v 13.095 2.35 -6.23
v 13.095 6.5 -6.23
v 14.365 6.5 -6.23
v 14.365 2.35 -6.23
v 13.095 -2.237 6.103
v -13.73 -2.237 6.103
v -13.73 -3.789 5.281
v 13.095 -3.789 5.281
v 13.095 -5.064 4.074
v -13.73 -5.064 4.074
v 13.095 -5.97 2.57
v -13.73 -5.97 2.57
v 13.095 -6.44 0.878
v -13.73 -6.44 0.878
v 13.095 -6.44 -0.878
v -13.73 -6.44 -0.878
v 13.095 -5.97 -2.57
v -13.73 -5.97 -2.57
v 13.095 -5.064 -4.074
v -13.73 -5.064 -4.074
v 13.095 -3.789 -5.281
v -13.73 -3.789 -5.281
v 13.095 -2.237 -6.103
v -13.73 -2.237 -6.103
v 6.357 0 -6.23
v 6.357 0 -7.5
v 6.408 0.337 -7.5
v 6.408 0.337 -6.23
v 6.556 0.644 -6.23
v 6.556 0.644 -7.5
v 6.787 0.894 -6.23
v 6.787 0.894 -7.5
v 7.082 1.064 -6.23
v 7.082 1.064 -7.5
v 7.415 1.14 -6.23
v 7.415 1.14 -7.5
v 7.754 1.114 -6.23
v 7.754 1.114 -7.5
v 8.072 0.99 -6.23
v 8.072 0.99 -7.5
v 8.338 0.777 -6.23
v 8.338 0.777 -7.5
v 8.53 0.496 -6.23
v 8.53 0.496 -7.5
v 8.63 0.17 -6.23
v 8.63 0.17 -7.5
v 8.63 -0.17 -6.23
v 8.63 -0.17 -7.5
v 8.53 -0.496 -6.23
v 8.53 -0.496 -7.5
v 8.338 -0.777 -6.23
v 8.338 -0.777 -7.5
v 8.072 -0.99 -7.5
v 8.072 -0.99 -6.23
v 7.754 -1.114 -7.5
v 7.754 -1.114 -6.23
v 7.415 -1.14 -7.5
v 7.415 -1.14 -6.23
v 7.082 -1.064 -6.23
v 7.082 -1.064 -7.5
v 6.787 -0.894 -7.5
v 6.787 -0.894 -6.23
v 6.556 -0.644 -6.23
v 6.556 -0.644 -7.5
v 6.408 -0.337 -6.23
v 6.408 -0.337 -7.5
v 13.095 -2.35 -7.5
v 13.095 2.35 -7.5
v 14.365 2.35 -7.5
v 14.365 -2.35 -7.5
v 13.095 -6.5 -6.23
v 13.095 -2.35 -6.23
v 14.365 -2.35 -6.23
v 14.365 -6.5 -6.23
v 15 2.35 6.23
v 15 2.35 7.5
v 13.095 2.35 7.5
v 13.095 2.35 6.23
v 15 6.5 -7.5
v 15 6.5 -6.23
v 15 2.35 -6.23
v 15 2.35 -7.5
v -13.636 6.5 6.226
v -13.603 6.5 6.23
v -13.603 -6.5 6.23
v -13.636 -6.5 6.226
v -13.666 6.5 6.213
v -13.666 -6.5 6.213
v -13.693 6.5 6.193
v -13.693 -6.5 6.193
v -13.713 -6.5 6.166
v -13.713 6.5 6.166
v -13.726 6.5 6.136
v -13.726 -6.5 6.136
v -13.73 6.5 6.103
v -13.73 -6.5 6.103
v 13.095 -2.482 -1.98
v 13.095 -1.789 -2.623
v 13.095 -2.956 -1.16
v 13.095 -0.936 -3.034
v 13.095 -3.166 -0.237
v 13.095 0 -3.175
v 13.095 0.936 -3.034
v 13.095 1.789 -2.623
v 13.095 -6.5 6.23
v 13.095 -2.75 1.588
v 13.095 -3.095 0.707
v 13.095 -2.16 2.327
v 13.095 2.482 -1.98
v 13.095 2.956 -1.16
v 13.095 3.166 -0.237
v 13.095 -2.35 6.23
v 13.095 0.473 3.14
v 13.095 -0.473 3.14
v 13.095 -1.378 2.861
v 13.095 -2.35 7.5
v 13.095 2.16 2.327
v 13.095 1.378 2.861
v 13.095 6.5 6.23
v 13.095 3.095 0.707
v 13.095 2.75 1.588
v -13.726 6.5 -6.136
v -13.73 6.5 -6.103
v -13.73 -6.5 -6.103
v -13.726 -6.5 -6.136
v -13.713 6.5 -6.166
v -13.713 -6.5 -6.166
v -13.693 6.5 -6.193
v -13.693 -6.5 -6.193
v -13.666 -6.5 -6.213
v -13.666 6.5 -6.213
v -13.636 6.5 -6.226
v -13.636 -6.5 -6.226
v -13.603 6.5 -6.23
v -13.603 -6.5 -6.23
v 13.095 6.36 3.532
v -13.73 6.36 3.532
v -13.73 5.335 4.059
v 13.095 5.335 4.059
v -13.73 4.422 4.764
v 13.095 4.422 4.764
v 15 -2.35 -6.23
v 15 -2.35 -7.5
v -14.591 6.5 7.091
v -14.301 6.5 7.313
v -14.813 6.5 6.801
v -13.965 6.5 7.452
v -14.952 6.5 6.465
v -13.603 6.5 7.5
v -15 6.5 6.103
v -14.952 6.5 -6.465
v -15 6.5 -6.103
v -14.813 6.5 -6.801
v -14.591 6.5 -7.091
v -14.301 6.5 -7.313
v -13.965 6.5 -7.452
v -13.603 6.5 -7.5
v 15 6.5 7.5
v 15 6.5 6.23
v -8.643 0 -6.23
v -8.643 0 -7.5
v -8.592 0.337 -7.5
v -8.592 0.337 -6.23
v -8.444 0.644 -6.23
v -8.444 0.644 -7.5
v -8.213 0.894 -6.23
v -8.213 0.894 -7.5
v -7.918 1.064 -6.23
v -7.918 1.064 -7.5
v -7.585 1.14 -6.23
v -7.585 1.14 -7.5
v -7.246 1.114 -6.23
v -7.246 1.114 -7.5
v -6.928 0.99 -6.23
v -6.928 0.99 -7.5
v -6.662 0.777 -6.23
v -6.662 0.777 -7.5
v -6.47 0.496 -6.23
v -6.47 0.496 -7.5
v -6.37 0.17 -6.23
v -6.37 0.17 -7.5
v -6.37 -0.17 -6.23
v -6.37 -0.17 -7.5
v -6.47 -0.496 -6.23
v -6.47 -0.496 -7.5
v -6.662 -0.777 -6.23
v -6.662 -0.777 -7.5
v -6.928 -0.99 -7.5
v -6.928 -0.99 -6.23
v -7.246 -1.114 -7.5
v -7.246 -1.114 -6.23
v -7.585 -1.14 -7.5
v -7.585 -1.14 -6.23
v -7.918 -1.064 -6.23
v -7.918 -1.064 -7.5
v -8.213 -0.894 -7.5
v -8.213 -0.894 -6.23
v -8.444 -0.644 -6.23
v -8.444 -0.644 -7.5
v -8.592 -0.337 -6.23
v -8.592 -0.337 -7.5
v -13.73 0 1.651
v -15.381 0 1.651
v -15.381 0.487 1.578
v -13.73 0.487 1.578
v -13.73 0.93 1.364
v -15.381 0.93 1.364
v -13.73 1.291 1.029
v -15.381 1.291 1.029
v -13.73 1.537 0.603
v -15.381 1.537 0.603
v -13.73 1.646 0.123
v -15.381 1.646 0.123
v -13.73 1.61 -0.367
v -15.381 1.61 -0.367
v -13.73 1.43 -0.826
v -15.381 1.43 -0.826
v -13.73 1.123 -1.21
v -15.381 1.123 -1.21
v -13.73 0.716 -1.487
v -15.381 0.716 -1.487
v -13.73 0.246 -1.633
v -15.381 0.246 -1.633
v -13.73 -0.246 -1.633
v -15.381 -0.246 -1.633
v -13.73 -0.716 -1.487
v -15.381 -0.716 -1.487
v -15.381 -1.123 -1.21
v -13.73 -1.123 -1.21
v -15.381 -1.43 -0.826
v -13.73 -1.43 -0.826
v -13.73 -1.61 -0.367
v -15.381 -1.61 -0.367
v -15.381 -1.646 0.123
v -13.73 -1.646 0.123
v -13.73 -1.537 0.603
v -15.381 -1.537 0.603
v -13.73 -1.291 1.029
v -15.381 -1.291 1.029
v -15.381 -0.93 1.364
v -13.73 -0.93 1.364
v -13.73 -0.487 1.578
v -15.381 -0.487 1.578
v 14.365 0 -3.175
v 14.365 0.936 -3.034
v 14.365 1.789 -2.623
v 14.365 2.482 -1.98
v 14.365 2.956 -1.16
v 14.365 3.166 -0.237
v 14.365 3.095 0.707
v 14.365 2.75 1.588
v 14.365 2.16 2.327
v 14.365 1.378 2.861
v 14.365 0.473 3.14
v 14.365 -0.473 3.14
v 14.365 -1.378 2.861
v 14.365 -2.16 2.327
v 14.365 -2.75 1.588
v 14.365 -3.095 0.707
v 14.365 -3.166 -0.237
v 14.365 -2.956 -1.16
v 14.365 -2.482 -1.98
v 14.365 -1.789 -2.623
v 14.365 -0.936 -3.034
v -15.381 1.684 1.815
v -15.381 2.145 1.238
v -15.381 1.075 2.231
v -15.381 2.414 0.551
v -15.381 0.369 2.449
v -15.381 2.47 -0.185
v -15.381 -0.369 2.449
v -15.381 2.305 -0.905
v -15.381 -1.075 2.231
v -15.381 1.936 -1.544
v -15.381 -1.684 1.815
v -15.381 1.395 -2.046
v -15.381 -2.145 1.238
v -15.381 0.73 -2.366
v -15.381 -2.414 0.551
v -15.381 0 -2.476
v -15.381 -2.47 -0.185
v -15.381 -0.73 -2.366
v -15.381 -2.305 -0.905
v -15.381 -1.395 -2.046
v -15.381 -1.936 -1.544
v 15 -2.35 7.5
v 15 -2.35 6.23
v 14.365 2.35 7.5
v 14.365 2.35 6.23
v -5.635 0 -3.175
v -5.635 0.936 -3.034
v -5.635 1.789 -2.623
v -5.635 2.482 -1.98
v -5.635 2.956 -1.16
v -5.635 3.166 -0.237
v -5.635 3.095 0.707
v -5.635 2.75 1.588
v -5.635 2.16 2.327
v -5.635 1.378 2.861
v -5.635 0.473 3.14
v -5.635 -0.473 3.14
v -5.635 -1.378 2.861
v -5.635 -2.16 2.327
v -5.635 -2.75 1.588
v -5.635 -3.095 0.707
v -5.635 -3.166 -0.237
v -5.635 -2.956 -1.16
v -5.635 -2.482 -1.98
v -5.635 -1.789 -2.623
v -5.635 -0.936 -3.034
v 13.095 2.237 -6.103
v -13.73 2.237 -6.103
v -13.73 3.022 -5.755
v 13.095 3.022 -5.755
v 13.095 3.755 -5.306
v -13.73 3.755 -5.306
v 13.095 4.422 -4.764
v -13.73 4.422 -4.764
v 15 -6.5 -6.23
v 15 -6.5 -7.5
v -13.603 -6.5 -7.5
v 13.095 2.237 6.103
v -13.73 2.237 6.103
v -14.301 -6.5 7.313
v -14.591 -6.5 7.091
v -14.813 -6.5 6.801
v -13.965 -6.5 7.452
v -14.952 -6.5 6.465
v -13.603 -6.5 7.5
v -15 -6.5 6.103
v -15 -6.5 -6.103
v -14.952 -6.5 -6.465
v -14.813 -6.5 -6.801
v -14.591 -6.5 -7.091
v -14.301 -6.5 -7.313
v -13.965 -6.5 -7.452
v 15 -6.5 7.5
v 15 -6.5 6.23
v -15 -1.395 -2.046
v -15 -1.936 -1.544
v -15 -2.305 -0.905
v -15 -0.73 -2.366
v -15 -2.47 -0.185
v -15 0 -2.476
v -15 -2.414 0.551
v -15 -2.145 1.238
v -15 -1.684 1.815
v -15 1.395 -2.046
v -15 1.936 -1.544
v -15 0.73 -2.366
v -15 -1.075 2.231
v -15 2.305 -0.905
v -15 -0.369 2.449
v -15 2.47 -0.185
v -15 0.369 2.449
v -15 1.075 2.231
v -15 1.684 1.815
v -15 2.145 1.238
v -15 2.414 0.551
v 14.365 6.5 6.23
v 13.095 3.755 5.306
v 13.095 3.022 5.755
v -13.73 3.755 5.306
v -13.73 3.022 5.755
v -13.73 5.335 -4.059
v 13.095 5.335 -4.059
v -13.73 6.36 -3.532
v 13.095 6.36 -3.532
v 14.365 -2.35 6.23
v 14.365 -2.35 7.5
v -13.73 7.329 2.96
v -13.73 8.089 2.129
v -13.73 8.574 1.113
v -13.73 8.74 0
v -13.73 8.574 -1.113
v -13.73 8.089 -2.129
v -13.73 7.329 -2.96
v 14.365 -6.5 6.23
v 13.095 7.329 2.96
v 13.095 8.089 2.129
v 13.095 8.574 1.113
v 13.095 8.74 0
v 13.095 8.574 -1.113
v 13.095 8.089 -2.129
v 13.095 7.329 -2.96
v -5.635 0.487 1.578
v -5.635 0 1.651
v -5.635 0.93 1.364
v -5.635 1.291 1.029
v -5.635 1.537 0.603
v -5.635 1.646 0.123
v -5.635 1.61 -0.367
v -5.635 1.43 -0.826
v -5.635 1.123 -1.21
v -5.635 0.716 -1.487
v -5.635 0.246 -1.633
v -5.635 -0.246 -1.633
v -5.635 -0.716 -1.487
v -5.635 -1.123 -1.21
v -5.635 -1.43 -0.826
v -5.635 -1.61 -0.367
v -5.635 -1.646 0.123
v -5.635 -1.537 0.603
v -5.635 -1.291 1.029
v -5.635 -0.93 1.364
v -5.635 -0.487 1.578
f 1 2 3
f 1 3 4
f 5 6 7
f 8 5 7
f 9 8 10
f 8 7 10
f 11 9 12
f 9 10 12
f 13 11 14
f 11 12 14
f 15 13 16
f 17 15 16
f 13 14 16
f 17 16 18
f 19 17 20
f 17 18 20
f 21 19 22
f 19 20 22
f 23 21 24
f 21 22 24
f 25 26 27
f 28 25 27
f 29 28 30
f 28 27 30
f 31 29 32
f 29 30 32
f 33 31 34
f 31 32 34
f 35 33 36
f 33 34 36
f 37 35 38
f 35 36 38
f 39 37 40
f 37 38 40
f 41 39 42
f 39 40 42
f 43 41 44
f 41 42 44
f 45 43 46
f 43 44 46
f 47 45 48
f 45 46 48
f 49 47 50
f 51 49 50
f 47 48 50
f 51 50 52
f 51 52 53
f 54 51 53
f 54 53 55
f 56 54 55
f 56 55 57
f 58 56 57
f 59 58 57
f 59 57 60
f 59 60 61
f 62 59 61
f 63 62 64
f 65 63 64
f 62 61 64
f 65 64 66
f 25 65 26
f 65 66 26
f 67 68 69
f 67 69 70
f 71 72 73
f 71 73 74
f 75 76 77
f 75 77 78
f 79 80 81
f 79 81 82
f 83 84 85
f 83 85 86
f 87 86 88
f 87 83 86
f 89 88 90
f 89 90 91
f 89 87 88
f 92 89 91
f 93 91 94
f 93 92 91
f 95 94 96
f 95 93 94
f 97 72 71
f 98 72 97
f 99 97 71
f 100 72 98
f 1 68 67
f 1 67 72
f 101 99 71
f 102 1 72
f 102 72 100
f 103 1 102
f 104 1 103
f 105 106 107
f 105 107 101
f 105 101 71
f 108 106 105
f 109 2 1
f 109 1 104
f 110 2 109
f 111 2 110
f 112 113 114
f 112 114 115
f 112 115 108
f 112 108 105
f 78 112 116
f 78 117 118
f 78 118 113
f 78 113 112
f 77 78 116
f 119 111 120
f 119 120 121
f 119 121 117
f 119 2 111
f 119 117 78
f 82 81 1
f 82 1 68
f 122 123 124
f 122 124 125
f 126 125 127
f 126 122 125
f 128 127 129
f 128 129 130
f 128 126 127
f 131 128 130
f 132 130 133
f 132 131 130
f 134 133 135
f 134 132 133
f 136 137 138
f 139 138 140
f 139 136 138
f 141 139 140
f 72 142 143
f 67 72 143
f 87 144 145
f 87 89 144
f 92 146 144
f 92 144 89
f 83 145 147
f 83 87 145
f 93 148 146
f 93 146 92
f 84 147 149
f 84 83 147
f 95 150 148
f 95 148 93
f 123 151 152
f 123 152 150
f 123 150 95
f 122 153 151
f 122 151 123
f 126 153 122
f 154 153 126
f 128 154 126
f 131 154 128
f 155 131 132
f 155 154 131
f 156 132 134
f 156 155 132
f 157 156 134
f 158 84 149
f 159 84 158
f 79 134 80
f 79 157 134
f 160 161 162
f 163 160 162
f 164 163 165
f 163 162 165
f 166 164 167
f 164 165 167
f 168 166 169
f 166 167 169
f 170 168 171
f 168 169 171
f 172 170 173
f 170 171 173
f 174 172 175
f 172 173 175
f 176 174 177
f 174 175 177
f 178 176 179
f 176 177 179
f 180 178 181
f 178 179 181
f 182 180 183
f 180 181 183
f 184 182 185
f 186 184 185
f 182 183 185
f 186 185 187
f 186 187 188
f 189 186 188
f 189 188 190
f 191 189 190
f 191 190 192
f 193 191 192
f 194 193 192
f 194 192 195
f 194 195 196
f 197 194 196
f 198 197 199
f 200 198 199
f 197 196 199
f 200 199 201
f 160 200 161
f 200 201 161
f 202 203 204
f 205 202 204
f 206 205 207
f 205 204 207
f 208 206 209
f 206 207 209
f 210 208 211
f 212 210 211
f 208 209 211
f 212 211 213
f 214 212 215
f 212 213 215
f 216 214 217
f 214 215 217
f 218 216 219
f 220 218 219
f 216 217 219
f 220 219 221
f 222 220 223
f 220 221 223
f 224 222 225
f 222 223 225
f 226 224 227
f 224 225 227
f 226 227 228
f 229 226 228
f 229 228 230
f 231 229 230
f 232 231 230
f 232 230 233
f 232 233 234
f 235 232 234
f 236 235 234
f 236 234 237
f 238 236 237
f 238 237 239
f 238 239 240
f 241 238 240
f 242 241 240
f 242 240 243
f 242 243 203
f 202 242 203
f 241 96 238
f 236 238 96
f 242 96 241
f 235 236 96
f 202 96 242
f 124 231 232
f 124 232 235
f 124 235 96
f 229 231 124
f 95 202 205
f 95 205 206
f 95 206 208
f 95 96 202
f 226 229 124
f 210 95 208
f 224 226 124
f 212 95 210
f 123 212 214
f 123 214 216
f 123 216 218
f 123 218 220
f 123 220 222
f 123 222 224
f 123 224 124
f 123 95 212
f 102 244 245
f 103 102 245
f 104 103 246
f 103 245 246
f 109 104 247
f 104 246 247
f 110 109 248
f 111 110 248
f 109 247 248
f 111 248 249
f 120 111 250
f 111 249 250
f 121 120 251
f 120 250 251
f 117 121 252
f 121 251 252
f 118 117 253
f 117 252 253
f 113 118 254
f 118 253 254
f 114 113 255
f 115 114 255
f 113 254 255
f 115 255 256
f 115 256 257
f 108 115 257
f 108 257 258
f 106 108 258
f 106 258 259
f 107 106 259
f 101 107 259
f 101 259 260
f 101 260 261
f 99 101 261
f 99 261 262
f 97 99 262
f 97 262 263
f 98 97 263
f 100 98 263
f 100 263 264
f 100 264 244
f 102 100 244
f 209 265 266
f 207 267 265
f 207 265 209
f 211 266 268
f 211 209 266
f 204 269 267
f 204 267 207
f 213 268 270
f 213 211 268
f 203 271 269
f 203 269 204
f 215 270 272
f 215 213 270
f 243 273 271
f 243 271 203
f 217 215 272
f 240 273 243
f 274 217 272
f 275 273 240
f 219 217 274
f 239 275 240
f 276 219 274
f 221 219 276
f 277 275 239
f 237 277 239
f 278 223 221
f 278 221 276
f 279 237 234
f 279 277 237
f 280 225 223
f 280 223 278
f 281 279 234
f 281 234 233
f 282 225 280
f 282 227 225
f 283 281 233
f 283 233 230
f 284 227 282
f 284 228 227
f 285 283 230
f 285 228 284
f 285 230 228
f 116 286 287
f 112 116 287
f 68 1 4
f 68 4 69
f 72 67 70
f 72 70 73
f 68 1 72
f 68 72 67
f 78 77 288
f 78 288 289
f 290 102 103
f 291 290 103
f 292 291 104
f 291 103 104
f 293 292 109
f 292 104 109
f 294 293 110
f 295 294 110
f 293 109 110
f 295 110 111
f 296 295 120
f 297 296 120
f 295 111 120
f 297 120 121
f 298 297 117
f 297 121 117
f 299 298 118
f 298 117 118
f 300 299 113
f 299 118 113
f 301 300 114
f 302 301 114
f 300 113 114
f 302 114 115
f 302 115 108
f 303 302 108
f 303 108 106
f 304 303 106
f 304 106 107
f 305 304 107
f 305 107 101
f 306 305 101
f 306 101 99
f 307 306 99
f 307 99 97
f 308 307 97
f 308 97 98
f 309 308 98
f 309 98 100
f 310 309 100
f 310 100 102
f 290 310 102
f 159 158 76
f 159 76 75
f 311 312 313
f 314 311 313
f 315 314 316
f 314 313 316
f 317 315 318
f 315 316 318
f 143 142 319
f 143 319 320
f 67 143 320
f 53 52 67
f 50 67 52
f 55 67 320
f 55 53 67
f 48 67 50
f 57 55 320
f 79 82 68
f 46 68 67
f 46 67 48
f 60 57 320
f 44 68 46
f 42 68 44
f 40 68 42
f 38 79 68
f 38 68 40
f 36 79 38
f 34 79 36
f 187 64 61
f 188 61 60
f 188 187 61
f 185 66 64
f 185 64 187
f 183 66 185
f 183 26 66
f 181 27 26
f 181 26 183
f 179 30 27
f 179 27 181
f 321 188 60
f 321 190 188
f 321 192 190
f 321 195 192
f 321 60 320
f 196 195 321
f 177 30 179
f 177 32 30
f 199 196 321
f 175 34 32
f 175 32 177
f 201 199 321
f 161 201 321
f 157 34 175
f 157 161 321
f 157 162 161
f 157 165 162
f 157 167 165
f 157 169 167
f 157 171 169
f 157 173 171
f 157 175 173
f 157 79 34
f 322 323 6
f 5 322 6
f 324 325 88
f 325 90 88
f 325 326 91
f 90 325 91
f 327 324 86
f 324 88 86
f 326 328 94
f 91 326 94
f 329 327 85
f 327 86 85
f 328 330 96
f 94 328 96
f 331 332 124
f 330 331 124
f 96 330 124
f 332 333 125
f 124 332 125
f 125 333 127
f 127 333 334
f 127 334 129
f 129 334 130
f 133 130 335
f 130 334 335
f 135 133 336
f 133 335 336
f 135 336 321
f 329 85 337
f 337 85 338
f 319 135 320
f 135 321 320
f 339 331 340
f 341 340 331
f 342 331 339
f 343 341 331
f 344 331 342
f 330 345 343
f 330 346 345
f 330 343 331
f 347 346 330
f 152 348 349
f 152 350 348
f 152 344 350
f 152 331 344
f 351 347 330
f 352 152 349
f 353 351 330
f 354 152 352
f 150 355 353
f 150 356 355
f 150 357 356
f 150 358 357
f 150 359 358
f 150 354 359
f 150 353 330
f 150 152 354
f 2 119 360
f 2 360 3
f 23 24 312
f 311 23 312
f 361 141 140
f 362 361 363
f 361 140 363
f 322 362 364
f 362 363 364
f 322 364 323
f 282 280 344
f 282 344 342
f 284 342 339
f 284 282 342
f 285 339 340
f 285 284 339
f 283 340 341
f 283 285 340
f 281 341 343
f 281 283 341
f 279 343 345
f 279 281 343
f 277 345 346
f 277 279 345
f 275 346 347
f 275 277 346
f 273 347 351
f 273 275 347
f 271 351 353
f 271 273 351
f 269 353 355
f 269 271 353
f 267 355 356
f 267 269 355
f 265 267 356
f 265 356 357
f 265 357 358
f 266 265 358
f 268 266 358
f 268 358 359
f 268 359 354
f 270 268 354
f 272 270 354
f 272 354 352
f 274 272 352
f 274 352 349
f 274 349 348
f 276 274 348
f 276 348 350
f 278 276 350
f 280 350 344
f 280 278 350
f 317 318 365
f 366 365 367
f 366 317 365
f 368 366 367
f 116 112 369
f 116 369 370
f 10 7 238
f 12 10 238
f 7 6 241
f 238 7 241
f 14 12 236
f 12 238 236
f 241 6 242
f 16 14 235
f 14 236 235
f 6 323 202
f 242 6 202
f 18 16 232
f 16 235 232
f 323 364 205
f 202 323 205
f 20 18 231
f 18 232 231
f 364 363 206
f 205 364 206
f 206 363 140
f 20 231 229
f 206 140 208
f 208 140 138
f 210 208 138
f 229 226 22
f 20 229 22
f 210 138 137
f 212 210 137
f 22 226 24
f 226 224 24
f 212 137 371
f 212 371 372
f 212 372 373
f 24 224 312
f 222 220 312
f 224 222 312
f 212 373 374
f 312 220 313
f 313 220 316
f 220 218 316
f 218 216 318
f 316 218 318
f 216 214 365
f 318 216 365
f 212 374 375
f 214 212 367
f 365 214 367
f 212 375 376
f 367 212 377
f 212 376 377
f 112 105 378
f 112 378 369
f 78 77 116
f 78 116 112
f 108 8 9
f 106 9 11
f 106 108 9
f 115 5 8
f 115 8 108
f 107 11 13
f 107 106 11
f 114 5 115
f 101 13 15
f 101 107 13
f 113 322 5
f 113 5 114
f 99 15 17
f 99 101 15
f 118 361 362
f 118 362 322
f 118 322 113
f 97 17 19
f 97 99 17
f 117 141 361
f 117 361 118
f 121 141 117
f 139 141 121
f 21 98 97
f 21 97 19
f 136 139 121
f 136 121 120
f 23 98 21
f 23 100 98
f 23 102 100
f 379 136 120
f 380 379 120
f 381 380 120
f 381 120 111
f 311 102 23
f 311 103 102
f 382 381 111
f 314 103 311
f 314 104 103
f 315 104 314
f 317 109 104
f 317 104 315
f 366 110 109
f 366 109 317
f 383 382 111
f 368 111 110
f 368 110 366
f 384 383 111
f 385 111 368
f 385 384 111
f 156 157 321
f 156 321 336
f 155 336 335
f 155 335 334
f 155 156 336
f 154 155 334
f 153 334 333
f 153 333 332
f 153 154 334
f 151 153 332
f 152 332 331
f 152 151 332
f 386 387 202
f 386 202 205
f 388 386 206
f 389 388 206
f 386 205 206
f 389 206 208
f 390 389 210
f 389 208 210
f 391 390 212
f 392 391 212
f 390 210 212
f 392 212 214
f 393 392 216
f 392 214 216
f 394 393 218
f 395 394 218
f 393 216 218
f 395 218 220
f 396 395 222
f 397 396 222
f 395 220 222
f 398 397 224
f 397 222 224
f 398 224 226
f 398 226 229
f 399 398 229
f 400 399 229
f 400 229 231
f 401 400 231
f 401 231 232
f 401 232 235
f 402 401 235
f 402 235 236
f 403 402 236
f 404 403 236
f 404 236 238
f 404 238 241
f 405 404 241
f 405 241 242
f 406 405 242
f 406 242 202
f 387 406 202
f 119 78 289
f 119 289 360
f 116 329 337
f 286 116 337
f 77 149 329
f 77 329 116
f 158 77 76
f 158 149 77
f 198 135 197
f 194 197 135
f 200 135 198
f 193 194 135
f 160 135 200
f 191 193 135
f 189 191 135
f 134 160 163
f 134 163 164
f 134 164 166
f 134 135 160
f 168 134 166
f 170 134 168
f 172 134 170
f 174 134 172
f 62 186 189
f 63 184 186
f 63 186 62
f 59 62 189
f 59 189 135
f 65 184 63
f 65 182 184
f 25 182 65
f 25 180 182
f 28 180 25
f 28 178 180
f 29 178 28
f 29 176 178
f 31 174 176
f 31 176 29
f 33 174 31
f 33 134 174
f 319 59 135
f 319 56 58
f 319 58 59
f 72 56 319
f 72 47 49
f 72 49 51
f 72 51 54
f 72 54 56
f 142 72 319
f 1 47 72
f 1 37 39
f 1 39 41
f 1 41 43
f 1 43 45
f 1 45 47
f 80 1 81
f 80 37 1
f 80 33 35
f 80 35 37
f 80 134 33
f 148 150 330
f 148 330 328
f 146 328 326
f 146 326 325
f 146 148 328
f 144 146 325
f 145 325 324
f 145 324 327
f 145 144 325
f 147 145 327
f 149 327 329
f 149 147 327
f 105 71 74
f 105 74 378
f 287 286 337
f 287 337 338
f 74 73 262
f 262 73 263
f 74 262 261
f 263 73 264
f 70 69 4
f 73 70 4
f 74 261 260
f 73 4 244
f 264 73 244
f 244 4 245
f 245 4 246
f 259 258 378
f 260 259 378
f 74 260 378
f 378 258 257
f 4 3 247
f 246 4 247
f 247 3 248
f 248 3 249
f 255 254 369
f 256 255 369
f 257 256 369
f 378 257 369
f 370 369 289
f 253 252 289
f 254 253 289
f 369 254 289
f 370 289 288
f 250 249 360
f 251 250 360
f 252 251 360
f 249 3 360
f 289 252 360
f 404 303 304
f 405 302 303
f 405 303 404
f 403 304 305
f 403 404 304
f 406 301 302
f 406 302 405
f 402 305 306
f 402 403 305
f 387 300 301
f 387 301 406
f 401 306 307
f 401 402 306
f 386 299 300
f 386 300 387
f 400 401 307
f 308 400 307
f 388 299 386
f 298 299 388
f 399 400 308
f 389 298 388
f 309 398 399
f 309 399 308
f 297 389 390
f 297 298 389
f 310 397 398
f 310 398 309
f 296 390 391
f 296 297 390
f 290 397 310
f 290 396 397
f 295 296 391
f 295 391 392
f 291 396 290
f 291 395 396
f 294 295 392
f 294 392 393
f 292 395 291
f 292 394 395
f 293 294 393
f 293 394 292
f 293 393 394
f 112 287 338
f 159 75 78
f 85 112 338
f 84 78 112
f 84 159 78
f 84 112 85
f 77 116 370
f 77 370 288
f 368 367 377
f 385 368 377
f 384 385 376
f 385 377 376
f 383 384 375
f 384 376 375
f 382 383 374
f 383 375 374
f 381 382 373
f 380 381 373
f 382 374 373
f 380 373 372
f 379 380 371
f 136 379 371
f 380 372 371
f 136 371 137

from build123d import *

# Parameters (mm, degrees)
T_LE_DE_BASE_PLI_E1_DEPTH = 6.5
ESQUISSE6_W               = 1.27
ESQUISSE6_H               = 4.699
ENL_V_MAT_EXTRU_1_DEPTH   = 1.905
BOSS_EXTRU_1_DEPTH        = 1.27
BOSS_EXTRU_2_DEPTH        = 26.825
CONG_1_R                  = 6.35
ESQUISSE13_R              = 1.651
ENL_V_MAT_EXTRU_2_DEPTH   = 33.134679114
BOSS_EXTRU_3_START        = 0.381
ESQUISSE14_R              = 2.4765
ESQUISSE14_R_2            = 1.651
BOSS_EXTRU_3_DEPTH        = 0.381
ESQUISSE15_R              = 3.175
ENL_V_MAT_EXTRU_3_DEPTH   = 20
ESQUISSE19_R              = 1.143
ENL_V_MAT_EXTRU_7_DEPTH   = 1.27


# Read off the part's stored shape, not the designer's step: Boss.-Extru.2
# Sheet-metal steps are written as plain solids
with BuildPart() as part:
    # Esquisse1 → Tôle de base pliée1 (new, symmetric)
    with BuildSketch(Plane(origin=(0, 0, 0), x_dir=(1, 0, 0), z_dir=(0, 1, 0))):
        with BuildLine():
            Line((15, 7.5), (-13.603, 7.5))
            ThreePointArc((-13.603, 7.5), (-14.590828173, 7.090828173), (-15, 6.103))
            Line((-15, 6.103), (-15, -6.103))
            ThreePointArc((-15, -6.103), (-14.590828173, -7.090828173), (-13.603, -7.5))
            Line((-13.603, -7.5), (15, -7.5))
            Line((15, -7.5), (15, -6.23))
            Line((15, -6.23), (-13.603, -6.23))
            ThreePointArc((-13.603, -6.23), (-13.692802561, -6.192802561), (-13.73, -6.103))
            Line((-13.73, -6.103), (-13.73, 6.103))
            ThreePointArc((-13.73, 6.103), (-13.692802561, 6.192802561), (-13.603, 6.23))
            Line((-13.603, 6.23), (15, 6.23))
            Line((15, 6.23), (15, 7.5))
        make_face()
    extrude(amount=T_LE_DE_BASE_PLI_E1_DEPTH, both=True)

    # Esquisse6 → Enlèv. mat.-Extru.1 (cut)
    with BuildSketch(Plane(origin=(15, 0, 0), x_dir=(0, 0, -1), z_dir=(1, 0, 0))):
        with Locations((-6.865, 0)):
            Rectangle(ESQUISSE6_W, ESQUISSE6_H)
        with Locations((6.865, 0)):
            Rectangle(ESQUISSE6_W, ESQUISSE6_H)
    extrude(amount=-ENL_V_MAT_EXTRU_1_DEPTH, mode=Mode.SUBTRACT)


with BuildPart() as body_2:
    # Esquisse7 → Boss.-Extru.1 (new body)
    with BuildSketch(Plane(origin=(13.095, 0, 0), x_dir=(0, 0, -1), z_dir=(1, 0, 0))):
        Polygon((-7.5, 2.3495), (-6.23, 2.3495), (-6.23, 6.5), (6.23, 6.5), (6.23, 2.3495), (7.5, 2.3495), (7.5, -2.3495), (6.23, -2.3495), (6.23, -6.5), (-6.23, -6.5), (-6.23, -2.3495), (-7.5, -2.3495), align=None)
    extrude(amount=BOSS_EXTRU_1_DEPTH)


with BuildPart() as body_3:
    # Boss.-Extru.2 outline → Boss.-Extru.2 (new body)
    with BuildSketch(Plane(origin=(-13.73, 0, 0), x_dir=(0, 0, -1), z_dir=(1, 0, 0))):
        with BuildLine():
            ThreePointArc((6.103, 2.2368261), (5.176867338, 3.93065447), (3.794095002, 5.277768763))
            ThreePointArc((3.794095002, 5.277768763), (0, 8.74), (-3.794095002, 5.277768763))
            ThreePointArc((-3.794095002, 5.277768763), (-5.176867338, 3.93065447), (-6.103, 2.2368261))
            Line((-6.103, 2.2368261), (-6.103, -2.2368261))
            ThreePointArc((-6.103, -2.2368261), (0, -6.5), (6.103, -2.2368261))
            Line((6.103, -2.2368261), (6.103, 2.2368261))
        make_face()
    extrude(amount=BOSS_EXTRU_2_DEPTH)

    # Congé1
    cong_1_edges = [body_3.edges().sort_by_distance(p)[0] for p in [
        (-0.3175, 5.277768763, -3.794095002),
        (-0.3175, 5.277768763, 3.794095002),
    ]]
    fillet(cong_1_edges, radius=CONG_1_R)


with BuildPart() as enl_v_mat_extru_2_tool:
    # Esquisse13 → Enlèv. mat.-Extru.2 (new, through all)
    with BuildSketch(Plane.ZY.offset(15)):
        Circle(ESQUISSE13_R)
    extrude(amount=-ENL_V_MAT_EXTRU_2_DEPTH)


with BuildPart() as part_1:
    add(part.part)

    # Enlèv. mat.-Extru.2: cut by enl_v_mat_extru_2_tool
    add(enl_v_mat_extru_2_tool.part, mode=Mode.SUBTRACT)

    # Esquisse14 → Boss.-Extru.3 (add)
    with BuildSketch(Plane.ZY.offset(15).offset(BOSS_EXTRU_3_START)):
        with Locations(Location((0, 0, 0), (0, 0, 180))):
            Circle(ESQUISSE14_R)
        Circle(ESQUISSE14_R_2, mode=Mode.SUBTRACT)
    extrude(amount=-BOSS_EXTRU_3_DEPTH)

    # Esquisse19 → Enlèv. mat.-Extru.7 (cut)
    with BuildSketch(Plane(origin=(0, 0, -7.5), x_dir=(-1, 0, 0), z_dir=(0, 0, -1))):
        with Locations((-7.5, 0)):
            Circle(ESQUISSE19_R)
        with Locations((7.5, 0)):
            Circle(ESQUISSE19_R)
    extrude(amount=-ENL_V_MAT_EXTRU_7_DEPTH, mode=Mode.SUBTRACT)


with BuildPart() as body_2_1:
    add(body_2.part)

    # Enlèv. mat.-Extru.2: cut by enl_v_mat_extru_2_tool
    add(enl_v_mat_extru_2_tool.part, mode=Mode.SUBTRACT)


with BuildPart() as body_3_1:
    add(body_3.part)

    # Enlèv. mat.-Extru.2: cut by enl_v_mat_extru_2_tool
    add(enl_v_mat_extru_2_tool.part, mode=Mode.SUBTRACT)


with BuildPart() as enl_v_mat_extru_3_tool:
    # Esquisse15 → Enlèv. mat.-Extru.3 (new body)
    with BuildSketch(Plane(origin=(14.365, 0, 0), x_dir=(0, 0, -1), z_dir=(1, 0, 0))):
        Circle(ESQUISSE15_R)
    extrude(amount=-ENL_V_MAT_EXTRU_3_DEPTH)


with BuildPart() as body_2_2:
    add(body_2_1.part)

    # Enlèv. mat.-Extru.3: cut by enl_v_mat_extru_3_tool
    add(enl_v_mat_extru_3_tool.part, mode=Mode.SUBTRACT)


with BuildPart() as body_3_2:
    add(body_3_1.part)

    # Enlèv. mat.-Extru.3: cut by enl_v_mat_extru_3_tool
    add(enl_v_mat_extru_3_tool.part, mode=Mode.SUBTRACT)


solid = Compound([part_1.part, body_2_2.part, body_3_2.part])
